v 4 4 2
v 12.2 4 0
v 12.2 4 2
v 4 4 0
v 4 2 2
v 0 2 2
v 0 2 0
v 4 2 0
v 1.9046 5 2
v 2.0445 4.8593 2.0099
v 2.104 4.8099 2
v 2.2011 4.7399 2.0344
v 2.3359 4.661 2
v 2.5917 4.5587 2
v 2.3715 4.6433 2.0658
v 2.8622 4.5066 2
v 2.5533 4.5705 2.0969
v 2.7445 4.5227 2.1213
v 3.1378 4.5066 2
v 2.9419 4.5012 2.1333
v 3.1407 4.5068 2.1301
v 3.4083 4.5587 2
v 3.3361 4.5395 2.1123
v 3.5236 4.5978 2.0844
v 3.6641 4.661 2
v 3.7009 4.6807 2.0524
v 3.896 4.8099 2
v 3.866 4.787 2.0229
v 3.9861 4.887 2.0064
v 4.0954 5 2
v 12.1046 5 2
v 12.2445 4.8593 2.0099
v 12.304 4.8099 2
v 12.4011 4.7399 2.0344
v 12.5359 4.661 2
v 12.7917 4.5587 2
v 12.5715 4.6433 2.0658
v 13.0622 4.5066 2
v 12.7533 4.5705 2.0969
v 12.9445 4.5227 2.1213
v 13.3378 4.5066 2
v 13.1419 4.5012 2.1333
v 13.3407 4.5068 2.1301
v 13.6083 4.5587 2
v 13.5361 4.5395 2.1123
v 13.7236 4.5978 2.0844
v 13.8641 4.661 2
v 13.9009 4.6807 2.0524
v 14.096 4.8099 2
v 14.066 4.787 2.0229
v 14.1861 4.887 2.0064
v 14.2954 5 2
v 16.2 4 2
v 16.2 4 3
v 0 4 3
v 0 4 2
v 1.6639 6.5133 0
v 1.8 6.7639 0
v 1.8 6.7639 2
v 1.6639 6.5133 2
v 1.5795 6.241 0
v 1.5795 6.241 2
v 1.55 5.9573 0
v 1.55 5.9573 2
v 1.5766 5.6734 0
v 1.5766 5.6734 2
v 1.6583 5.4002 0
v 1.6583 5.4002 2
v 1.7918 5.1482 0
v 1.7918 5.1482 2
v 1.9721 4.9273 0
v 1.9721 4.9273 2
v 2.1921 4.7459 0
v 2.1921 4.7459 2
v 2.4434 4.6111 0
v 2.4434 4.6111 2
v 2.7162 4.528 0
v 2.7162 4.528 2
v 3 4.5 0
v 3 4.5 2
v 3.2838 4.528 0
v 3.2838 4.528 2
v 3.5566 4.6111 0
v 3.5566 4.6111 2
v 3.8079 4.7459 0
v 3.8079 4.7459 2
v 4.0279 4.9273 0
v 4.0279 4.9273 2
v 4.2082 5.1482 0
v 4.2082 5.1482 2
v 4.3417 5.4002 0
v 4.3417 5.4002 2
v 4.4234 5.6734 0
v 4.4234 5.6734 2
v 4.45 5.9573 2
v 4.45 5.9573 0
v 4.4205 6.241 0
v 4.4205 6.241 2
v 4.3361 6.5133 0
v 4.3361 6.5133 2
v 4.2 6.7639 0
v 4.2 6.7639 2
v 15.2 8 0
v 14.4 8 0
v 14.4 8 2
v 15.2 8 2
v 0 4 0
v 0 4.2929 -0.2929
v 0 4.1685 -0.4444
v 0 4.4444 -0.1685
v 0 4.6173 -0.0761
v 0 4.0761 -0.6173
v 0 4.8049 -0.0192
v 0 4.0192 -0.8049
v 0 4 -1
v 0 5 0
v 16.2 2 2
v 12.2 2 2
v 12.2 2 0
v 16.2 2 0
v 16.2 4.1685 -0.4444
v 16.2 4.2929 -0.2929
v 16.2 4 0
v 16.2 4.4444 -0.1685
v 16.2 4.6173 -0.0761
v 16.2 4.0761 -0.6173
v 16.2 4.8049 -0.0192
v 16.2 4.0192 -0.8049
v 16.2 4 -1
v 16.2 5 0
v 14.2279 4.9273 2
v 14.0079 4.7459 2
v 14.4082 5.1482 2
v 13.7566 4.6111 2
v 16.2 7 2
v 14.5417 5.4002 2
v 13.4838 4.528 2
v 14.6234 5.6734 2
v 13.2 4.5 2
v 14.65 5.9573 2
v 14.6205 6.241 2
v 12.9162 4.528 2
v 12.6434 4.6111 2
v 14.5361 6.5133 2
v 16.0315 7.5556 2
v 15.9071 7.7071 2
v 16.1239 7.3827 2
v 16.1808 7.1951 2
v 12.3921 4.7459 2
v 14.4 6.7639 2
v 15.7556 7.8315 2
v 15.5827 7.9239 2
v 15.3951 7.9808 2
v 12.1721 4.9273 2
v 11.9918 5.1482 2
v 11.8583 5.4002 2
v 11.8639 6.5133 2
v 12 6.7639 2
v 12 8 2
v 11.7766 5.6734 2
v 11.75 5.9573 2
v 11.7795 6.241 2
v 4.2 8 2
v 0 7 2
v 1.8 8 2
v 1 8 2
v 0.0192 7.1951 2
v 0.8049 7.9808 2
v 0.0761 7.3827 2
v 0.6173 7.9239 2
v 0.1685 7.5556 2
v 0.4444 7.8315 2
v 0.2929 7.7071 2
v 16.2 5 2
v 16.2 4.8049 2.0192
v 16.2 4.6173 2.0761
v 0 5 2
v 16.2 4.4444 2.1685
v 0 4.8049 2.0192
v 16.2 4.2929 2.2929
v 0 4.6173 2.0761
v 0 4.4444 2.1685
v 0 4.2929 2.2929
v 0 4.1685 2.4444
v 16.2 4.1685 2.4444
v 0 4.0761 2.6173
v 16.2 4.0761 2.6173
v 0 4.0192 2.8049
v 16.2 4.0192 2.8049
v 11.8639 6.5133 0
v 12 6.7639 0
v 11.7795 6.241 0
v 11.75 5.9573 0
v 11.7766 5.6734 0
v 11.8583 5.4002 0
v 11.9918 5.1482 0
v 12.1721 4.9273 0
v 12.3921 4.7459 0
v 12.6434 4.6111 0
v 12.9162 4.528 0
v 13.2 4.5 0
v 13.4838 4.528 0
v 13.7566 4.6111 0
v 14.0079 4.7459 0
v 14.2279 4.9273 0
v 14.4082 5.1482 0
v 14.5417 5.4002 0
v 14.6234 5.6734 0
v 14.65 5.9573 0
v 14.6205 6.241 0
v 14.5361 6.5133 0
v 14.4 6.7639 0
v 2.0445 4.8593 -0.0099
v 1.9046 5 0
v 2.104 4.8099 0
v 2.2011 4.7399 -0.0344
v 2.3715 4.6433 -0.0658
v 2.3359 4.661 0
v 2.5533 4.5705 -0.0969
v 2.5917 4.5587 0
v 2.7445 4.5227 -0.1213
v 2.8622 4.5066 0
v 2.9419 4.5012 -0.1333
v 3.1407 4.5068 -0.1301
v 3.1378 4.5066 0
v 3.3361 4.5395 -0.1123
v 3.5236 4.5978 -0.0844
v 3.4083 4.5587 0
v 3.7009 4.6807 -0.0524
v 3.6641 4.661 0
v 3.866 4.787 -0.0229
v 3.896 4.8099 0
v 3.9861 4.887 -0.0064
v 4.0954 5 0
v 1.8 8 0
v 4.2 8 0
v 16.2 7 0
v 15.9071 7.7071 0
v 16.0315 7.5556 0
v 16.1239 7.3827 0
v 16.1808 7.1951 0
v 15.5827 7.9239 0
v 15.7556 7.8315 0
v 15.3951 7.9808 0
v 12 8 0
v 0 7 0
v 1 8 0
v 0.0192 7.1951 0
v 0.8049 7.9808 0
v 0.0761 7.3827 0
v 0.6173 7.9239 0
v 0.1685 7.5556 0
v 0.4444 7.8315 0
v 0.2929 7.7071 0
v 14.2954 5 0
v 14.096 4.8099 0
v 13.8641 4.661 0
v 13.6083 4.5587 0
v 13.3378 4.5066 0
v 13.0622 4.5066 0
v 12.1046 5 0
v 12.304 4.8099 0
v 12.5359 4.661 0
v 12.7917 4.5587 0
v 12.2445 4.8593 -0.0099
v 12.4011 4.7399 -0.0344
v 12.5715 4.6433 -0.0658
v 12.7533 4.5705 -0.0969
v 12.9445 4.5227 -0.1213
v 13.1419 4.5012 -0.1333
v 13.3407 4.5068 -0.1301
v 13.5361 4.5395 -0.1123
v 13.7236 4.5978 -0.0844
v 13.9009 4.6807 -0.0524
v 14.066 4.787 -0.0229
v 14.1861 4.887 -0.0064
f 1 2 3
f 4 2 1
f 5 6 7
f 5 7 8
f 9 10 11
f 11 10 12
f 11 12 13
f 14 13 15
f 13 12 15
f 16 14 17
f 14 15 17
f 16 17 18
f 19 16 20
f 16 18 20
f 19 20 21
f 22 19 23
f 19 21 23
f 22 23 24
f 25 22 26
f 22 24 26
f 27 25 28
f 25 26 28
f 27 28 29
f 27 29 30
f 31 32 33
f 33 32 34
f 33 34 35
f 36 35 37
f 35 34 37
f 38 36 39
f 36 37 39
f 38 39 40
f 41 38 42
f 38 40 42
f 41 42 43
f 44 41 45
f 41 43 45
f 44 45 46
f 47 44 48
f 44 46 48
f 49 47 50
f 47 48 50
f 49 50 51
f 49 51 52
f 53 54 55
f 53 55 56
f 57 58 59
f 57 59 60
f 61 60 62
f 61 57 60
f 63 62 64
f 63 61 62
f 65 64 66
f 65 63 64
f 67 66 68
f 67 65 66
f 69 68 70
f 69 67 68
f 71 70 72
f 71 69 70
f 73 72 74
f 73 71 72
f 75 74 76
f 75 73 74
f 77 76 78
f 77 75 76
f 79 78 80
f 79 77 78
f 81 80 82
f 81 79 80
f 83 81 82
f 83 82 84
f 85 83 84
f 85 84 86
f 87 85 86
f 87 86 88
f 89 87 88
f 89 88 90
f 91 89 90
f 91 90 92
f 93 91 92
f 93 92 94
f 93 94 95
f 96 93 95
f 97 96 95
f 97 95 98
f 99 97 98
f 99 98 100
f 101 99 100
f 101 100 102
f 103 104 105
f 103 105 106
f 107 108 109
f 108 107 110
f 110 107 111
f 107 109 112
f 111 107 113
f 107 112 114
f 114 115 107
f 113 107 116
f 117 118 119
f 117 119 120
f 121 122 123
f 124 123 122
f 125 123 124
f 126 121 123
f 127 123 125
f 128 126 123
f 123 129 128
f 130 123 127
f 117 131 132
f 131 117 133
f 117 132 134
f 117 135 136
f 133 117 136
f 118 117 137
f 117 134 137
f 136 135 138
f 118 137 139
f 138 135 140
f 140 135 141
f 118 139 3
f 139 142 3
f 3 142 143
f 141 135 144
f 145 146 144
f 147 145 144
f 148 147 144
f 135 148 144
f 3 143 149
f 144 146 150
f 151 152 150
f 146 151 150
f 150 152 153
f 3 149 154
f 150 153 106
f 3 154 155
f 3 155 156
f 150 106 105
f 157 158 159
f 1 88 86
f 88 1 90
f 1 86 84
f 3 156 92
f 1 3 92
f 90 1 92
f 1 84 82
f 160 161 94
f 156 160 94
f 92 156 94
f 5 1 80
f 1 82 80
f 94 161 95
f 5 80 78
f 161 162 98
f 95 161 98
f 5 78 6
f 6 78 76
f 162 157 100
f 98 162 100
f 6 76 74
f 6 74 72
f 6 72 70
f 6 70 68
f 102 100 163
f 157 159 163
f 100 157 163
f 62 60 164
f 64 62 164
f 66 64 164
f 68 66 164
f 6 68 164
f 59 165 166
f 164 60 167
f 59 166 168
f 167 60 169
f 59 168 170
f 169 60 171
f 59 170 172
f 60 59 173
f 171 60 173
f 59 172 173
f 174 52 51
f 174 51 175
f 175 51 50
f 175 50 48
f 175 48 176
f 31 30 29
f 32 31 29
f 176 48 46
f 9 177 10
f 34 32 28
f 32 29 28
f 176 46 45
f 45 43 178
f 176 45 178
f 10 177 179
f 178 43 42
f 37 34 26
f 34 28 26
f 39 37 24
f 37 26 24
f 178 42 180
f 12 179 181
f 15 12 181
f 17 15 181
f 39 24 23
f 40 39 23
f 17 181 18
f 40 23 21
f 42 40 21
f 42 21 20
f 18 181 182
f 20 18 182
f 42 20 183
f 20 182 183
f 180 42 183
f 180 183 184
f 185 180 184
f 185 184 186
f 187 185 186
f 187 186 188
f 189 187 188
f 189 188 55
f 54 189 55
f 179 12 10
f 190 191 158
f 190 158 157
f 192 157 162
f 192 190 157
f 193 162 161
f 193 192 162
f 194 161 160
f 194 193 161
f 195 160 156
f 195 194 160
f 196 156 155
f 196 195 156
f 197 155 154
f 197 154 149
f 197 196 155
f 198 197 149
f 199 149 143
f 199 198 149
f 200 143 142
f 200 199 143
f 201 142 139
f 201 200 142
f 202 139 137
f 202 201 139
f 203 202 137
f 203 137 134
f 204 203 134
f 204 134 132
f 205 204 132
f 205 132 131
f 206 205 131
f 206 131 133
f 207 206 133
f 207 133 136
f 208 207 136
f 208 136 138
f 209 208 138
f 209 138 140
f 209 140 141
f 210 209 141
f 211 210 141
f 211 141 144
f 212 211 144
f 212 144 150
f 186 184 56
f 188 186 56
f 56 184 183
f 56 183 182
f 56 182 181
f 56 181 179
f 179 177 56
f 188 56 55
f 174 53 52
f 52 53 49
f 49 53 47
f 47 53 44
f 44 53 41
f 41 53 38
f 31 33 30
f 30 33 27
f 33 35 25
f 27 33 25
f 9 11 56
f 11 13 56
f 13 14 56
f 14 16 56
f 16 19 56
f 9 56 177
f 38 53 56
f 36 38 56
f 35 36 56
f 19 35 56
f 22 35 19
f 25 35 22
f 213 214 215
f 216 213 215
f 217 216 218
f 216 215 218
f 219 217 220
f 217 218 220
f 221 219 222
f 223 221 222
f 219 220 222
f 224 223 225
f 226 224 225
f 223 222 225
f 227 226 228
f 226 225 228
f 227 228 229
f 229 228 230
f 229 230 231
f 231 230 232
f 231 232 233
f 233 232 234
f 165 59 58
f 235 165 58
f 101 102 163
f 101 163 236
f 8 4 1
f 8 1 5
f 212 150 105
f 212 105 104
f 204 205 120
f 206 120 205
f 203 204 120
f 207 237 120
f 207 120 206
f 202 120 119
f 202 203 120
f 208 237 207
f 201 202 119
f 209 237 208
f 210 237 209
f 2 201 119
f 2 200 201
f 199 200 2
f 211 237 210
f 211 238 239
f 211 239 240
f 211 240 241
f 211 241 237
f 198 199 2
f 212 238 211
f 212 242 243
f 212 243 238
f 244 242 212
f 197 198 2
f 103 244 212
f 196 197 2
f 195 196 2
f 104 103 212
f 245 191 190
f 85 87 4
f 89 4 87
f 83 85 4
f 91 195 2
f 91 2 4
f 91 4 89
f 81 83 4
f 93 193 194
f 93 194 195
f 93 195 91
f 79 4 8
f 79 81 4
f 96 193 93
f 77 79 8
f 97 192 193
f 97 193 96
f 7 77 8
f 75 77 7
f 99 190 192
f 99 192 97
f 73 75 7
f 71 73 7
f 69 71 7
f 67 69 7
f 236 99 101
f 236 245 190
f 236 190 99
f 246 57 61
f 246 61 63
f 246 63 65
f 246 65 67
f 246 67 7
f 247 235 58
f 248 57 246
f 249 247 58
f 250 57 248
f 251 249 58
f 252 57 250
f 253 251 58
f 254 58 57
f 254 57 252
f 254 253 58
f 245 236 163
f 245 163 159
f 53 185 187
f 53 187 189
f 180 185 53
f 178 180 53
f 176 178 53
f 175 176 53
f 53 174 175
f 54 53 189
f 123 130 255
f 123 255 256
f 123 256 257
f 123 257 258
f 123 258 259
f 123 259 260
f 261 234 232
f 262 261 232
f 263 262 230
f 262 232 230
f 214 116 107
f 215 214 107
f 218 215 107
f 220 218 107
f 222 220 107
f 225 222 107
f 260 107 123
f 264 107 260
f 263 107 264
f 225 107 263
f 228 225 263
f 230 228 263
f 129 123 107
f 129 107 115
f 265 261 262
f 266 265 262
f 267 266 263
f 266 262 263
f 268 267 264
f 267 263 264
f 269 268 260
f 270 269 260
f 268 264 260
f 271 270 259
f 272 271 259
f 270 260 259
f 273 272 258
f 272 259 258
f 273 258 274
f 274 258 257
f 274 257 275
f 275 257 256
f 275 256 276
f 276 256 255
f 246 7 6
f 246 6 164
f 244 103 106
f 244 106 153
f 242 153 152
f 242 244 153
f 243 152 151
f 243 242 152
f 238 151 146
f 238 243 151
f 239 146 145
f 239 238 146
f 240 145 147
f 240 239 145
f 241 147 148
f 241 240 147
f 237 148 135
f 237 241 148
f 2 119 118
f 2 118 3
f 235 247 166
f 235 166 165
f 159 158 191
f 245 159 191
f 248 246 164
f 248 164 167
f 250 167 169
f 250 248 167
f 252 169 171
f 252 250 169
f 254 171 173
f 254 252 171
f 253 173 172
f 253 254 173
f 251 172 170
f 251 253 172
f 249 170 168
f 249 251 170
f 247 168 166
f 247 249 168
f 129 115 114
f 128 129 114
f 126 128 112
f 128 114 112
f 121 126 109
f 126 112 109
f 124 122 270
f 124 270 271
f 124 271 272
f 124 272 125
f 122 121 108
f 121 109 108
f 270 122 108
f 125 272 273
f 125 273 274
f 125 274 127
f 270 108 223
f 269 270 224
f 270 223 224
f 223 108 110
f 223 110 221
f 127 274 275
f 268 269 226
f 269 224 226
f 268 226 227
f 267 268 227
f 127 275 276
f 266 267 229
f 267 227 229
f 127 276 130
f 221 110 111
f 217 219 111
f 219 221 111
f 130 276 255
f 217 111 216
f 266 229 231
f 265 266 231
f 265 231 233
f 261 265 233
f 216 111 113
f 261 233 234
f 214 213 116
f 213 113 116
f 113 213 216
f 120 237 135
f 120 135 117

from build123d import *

# Parameters (mm, degrees)
BOSS_EXTRUDE1_DEPTH     = 2
BOSS_EXTRUDE2_DEPTH     = 16.2
BOSS_EXTRUDE2_2_DEPTH   = 16.2
SKETCH3_W               = 4
SKETCH3_H               = 2
CUT_EXTRUDE1_DEPTH      = 4
CUT_EXTRUDE4_START      = -1.236059
SKETCH5_W               = 2.4
SKETCH5_H               = 2
CUT_EXTRUDE4_DEPTH      = 1.236059
SKETCH8_R               = 1.45
CUT_EXTRUDE6_DEPTH      = 3
CUT_EXTRUDE6_DEPTH_BACK = 3


with BuildPart() as part:
    # Sketch1 → Boss-Extrude1 (new body)
    with BuildSketch(Plane.XY):
        with BuildLine():
            Line((4, 8), (8.1, 8))
            Line((8.1, 8), (12.2, 8))
            Line((12.2, 8), (12.2, 7))
            ThreePointArc((12.2, 7), (13.2, 4.5), (14.2, 7))
            Line((14.2, 7), (14.2, 8))
            Line((14.2, 8), (15.2, 8))
            ThreePointArc((15.2, 8), (15.907106781, 7.707106781), (16.2, 7))
            Line((16.2, 7), (16.2, 0))
            Line((16.2, 0), (12.2, 0))
            Line((12.2, 0), (12.2, 4))
            Line((12.2, 4), (4, 4))
            Line((4, 4), (4, 0))
            Line((4, 0), (0, 0))
            Line((0, 0), (0, 7))
            ThreePointArc((0, 7), (0.292893219, 7.707106781), (1, 8))
            Line((1, 8), (2, 8))
            Line((2, 8), (2, 7))
            ThreePointArc((2, 7), (3, 4.5), (4, 7))
            Line((4, 7), (4, 8))
        make_face()
    extrude(amount=BOSS_EXTRUDE1_DEPTH)

    # Sketch3 → Cut-Extrude1 (cut, through all)
    with BuildSketch(Plane.XY.offset(2)):
        with Locations((2, 1)):
            Rectangle(SKETCH3_W, SKETCH3_H)
        with Locations((14.2, 1)):
            Rectangle(SKETCH3_W, SKETCH3_H)
    extrude(amount=-CUT_EXTRUDE1_DEPTH, mode=Mode.SUBTRACT)

    # Sketch5 → Cut-Extrude4 (cut)
    with BuildSketch(Plane(origin=(0, 8, 0), x_dir=(1, 0, 0), z_dir=(0, 1, 0)).offset(CUT_EXTRUDE4_START)):
        with Locations((3, -1)):
            Rectangle(SKETCH5_W, SKETCH5_H)
        with Locations((13.2, -1)):
            Rectangle(SKETCH5_W, SKETCH5_H)
    extrude(amount=CUT_EXTRUDE4_DEPTH, mode=Mode.SUBTRACT)


with BuildPart() as body_2:
    # Sketch2 → Boss-Extrude2 (new body)
    with BuildSketch(Plane.ZY):
        with BuildLine():
            Line((2, 4), (2, 5))
            ThreePointArc((2, 5), (2.292893219, 4.292893219), (3, 4))
            Line((3, 4), (2, 4))
        make_face()
    extrude(amount=-BOSS_EXTRUDE2_DEPTH)


with BuildPart() as body_3:
    # Sketch2 → Boss-Extrude2 2 (new body)
    with BuildSketch(Plane.ZY):
        with BuildLine():
            Line((0, 4), (-1, 4))
            ThreePointArc((-1, 4), (-0.292893219, 4.292893219), (0, 5))
            Line((0, 5), (0, 4))
        make_face()
    extrude(amount=-BOSS_EXTRUDE2_2_DEPTH)


with BuildPart() as cut_extrude6_tool:
    # Sketch8 → Cut-Extrude6 (new body, two sides)
    with BuildSketch(Plane.XY.offset(1)) as cut_extrude6_sk:
        with Locations((3, 5.95)):
            Circle(SKETCH8_R)
        with Locations((13.2, 5.95)):
            Circle(SKETCH8_R)
    extrude(amount=CUT_EXTRUDE6_DEPTH)
    extrude(cut_extrude6_sk.sketch, amount=-CUT_EXTRUDE6_DEPTH_BACK)


with BuildPart() as body_2_1:
    add(body_2.part)

    # Cut-Extrude6: cut by cut_extrude6_tool
    add(cut_extrude6_tool.part, mode=Mode.SUBTRACT)


with BuildPart() as body_3_1:
    add(body_3.part)

    # Cut-Extrude6: cut by cut_extrude6_tool
    add(cut_extrude6_tool.part, mode=Mode.SUBTRACT)


solid = Compound([part.part, body_2_1.part, body_3_1.part])
